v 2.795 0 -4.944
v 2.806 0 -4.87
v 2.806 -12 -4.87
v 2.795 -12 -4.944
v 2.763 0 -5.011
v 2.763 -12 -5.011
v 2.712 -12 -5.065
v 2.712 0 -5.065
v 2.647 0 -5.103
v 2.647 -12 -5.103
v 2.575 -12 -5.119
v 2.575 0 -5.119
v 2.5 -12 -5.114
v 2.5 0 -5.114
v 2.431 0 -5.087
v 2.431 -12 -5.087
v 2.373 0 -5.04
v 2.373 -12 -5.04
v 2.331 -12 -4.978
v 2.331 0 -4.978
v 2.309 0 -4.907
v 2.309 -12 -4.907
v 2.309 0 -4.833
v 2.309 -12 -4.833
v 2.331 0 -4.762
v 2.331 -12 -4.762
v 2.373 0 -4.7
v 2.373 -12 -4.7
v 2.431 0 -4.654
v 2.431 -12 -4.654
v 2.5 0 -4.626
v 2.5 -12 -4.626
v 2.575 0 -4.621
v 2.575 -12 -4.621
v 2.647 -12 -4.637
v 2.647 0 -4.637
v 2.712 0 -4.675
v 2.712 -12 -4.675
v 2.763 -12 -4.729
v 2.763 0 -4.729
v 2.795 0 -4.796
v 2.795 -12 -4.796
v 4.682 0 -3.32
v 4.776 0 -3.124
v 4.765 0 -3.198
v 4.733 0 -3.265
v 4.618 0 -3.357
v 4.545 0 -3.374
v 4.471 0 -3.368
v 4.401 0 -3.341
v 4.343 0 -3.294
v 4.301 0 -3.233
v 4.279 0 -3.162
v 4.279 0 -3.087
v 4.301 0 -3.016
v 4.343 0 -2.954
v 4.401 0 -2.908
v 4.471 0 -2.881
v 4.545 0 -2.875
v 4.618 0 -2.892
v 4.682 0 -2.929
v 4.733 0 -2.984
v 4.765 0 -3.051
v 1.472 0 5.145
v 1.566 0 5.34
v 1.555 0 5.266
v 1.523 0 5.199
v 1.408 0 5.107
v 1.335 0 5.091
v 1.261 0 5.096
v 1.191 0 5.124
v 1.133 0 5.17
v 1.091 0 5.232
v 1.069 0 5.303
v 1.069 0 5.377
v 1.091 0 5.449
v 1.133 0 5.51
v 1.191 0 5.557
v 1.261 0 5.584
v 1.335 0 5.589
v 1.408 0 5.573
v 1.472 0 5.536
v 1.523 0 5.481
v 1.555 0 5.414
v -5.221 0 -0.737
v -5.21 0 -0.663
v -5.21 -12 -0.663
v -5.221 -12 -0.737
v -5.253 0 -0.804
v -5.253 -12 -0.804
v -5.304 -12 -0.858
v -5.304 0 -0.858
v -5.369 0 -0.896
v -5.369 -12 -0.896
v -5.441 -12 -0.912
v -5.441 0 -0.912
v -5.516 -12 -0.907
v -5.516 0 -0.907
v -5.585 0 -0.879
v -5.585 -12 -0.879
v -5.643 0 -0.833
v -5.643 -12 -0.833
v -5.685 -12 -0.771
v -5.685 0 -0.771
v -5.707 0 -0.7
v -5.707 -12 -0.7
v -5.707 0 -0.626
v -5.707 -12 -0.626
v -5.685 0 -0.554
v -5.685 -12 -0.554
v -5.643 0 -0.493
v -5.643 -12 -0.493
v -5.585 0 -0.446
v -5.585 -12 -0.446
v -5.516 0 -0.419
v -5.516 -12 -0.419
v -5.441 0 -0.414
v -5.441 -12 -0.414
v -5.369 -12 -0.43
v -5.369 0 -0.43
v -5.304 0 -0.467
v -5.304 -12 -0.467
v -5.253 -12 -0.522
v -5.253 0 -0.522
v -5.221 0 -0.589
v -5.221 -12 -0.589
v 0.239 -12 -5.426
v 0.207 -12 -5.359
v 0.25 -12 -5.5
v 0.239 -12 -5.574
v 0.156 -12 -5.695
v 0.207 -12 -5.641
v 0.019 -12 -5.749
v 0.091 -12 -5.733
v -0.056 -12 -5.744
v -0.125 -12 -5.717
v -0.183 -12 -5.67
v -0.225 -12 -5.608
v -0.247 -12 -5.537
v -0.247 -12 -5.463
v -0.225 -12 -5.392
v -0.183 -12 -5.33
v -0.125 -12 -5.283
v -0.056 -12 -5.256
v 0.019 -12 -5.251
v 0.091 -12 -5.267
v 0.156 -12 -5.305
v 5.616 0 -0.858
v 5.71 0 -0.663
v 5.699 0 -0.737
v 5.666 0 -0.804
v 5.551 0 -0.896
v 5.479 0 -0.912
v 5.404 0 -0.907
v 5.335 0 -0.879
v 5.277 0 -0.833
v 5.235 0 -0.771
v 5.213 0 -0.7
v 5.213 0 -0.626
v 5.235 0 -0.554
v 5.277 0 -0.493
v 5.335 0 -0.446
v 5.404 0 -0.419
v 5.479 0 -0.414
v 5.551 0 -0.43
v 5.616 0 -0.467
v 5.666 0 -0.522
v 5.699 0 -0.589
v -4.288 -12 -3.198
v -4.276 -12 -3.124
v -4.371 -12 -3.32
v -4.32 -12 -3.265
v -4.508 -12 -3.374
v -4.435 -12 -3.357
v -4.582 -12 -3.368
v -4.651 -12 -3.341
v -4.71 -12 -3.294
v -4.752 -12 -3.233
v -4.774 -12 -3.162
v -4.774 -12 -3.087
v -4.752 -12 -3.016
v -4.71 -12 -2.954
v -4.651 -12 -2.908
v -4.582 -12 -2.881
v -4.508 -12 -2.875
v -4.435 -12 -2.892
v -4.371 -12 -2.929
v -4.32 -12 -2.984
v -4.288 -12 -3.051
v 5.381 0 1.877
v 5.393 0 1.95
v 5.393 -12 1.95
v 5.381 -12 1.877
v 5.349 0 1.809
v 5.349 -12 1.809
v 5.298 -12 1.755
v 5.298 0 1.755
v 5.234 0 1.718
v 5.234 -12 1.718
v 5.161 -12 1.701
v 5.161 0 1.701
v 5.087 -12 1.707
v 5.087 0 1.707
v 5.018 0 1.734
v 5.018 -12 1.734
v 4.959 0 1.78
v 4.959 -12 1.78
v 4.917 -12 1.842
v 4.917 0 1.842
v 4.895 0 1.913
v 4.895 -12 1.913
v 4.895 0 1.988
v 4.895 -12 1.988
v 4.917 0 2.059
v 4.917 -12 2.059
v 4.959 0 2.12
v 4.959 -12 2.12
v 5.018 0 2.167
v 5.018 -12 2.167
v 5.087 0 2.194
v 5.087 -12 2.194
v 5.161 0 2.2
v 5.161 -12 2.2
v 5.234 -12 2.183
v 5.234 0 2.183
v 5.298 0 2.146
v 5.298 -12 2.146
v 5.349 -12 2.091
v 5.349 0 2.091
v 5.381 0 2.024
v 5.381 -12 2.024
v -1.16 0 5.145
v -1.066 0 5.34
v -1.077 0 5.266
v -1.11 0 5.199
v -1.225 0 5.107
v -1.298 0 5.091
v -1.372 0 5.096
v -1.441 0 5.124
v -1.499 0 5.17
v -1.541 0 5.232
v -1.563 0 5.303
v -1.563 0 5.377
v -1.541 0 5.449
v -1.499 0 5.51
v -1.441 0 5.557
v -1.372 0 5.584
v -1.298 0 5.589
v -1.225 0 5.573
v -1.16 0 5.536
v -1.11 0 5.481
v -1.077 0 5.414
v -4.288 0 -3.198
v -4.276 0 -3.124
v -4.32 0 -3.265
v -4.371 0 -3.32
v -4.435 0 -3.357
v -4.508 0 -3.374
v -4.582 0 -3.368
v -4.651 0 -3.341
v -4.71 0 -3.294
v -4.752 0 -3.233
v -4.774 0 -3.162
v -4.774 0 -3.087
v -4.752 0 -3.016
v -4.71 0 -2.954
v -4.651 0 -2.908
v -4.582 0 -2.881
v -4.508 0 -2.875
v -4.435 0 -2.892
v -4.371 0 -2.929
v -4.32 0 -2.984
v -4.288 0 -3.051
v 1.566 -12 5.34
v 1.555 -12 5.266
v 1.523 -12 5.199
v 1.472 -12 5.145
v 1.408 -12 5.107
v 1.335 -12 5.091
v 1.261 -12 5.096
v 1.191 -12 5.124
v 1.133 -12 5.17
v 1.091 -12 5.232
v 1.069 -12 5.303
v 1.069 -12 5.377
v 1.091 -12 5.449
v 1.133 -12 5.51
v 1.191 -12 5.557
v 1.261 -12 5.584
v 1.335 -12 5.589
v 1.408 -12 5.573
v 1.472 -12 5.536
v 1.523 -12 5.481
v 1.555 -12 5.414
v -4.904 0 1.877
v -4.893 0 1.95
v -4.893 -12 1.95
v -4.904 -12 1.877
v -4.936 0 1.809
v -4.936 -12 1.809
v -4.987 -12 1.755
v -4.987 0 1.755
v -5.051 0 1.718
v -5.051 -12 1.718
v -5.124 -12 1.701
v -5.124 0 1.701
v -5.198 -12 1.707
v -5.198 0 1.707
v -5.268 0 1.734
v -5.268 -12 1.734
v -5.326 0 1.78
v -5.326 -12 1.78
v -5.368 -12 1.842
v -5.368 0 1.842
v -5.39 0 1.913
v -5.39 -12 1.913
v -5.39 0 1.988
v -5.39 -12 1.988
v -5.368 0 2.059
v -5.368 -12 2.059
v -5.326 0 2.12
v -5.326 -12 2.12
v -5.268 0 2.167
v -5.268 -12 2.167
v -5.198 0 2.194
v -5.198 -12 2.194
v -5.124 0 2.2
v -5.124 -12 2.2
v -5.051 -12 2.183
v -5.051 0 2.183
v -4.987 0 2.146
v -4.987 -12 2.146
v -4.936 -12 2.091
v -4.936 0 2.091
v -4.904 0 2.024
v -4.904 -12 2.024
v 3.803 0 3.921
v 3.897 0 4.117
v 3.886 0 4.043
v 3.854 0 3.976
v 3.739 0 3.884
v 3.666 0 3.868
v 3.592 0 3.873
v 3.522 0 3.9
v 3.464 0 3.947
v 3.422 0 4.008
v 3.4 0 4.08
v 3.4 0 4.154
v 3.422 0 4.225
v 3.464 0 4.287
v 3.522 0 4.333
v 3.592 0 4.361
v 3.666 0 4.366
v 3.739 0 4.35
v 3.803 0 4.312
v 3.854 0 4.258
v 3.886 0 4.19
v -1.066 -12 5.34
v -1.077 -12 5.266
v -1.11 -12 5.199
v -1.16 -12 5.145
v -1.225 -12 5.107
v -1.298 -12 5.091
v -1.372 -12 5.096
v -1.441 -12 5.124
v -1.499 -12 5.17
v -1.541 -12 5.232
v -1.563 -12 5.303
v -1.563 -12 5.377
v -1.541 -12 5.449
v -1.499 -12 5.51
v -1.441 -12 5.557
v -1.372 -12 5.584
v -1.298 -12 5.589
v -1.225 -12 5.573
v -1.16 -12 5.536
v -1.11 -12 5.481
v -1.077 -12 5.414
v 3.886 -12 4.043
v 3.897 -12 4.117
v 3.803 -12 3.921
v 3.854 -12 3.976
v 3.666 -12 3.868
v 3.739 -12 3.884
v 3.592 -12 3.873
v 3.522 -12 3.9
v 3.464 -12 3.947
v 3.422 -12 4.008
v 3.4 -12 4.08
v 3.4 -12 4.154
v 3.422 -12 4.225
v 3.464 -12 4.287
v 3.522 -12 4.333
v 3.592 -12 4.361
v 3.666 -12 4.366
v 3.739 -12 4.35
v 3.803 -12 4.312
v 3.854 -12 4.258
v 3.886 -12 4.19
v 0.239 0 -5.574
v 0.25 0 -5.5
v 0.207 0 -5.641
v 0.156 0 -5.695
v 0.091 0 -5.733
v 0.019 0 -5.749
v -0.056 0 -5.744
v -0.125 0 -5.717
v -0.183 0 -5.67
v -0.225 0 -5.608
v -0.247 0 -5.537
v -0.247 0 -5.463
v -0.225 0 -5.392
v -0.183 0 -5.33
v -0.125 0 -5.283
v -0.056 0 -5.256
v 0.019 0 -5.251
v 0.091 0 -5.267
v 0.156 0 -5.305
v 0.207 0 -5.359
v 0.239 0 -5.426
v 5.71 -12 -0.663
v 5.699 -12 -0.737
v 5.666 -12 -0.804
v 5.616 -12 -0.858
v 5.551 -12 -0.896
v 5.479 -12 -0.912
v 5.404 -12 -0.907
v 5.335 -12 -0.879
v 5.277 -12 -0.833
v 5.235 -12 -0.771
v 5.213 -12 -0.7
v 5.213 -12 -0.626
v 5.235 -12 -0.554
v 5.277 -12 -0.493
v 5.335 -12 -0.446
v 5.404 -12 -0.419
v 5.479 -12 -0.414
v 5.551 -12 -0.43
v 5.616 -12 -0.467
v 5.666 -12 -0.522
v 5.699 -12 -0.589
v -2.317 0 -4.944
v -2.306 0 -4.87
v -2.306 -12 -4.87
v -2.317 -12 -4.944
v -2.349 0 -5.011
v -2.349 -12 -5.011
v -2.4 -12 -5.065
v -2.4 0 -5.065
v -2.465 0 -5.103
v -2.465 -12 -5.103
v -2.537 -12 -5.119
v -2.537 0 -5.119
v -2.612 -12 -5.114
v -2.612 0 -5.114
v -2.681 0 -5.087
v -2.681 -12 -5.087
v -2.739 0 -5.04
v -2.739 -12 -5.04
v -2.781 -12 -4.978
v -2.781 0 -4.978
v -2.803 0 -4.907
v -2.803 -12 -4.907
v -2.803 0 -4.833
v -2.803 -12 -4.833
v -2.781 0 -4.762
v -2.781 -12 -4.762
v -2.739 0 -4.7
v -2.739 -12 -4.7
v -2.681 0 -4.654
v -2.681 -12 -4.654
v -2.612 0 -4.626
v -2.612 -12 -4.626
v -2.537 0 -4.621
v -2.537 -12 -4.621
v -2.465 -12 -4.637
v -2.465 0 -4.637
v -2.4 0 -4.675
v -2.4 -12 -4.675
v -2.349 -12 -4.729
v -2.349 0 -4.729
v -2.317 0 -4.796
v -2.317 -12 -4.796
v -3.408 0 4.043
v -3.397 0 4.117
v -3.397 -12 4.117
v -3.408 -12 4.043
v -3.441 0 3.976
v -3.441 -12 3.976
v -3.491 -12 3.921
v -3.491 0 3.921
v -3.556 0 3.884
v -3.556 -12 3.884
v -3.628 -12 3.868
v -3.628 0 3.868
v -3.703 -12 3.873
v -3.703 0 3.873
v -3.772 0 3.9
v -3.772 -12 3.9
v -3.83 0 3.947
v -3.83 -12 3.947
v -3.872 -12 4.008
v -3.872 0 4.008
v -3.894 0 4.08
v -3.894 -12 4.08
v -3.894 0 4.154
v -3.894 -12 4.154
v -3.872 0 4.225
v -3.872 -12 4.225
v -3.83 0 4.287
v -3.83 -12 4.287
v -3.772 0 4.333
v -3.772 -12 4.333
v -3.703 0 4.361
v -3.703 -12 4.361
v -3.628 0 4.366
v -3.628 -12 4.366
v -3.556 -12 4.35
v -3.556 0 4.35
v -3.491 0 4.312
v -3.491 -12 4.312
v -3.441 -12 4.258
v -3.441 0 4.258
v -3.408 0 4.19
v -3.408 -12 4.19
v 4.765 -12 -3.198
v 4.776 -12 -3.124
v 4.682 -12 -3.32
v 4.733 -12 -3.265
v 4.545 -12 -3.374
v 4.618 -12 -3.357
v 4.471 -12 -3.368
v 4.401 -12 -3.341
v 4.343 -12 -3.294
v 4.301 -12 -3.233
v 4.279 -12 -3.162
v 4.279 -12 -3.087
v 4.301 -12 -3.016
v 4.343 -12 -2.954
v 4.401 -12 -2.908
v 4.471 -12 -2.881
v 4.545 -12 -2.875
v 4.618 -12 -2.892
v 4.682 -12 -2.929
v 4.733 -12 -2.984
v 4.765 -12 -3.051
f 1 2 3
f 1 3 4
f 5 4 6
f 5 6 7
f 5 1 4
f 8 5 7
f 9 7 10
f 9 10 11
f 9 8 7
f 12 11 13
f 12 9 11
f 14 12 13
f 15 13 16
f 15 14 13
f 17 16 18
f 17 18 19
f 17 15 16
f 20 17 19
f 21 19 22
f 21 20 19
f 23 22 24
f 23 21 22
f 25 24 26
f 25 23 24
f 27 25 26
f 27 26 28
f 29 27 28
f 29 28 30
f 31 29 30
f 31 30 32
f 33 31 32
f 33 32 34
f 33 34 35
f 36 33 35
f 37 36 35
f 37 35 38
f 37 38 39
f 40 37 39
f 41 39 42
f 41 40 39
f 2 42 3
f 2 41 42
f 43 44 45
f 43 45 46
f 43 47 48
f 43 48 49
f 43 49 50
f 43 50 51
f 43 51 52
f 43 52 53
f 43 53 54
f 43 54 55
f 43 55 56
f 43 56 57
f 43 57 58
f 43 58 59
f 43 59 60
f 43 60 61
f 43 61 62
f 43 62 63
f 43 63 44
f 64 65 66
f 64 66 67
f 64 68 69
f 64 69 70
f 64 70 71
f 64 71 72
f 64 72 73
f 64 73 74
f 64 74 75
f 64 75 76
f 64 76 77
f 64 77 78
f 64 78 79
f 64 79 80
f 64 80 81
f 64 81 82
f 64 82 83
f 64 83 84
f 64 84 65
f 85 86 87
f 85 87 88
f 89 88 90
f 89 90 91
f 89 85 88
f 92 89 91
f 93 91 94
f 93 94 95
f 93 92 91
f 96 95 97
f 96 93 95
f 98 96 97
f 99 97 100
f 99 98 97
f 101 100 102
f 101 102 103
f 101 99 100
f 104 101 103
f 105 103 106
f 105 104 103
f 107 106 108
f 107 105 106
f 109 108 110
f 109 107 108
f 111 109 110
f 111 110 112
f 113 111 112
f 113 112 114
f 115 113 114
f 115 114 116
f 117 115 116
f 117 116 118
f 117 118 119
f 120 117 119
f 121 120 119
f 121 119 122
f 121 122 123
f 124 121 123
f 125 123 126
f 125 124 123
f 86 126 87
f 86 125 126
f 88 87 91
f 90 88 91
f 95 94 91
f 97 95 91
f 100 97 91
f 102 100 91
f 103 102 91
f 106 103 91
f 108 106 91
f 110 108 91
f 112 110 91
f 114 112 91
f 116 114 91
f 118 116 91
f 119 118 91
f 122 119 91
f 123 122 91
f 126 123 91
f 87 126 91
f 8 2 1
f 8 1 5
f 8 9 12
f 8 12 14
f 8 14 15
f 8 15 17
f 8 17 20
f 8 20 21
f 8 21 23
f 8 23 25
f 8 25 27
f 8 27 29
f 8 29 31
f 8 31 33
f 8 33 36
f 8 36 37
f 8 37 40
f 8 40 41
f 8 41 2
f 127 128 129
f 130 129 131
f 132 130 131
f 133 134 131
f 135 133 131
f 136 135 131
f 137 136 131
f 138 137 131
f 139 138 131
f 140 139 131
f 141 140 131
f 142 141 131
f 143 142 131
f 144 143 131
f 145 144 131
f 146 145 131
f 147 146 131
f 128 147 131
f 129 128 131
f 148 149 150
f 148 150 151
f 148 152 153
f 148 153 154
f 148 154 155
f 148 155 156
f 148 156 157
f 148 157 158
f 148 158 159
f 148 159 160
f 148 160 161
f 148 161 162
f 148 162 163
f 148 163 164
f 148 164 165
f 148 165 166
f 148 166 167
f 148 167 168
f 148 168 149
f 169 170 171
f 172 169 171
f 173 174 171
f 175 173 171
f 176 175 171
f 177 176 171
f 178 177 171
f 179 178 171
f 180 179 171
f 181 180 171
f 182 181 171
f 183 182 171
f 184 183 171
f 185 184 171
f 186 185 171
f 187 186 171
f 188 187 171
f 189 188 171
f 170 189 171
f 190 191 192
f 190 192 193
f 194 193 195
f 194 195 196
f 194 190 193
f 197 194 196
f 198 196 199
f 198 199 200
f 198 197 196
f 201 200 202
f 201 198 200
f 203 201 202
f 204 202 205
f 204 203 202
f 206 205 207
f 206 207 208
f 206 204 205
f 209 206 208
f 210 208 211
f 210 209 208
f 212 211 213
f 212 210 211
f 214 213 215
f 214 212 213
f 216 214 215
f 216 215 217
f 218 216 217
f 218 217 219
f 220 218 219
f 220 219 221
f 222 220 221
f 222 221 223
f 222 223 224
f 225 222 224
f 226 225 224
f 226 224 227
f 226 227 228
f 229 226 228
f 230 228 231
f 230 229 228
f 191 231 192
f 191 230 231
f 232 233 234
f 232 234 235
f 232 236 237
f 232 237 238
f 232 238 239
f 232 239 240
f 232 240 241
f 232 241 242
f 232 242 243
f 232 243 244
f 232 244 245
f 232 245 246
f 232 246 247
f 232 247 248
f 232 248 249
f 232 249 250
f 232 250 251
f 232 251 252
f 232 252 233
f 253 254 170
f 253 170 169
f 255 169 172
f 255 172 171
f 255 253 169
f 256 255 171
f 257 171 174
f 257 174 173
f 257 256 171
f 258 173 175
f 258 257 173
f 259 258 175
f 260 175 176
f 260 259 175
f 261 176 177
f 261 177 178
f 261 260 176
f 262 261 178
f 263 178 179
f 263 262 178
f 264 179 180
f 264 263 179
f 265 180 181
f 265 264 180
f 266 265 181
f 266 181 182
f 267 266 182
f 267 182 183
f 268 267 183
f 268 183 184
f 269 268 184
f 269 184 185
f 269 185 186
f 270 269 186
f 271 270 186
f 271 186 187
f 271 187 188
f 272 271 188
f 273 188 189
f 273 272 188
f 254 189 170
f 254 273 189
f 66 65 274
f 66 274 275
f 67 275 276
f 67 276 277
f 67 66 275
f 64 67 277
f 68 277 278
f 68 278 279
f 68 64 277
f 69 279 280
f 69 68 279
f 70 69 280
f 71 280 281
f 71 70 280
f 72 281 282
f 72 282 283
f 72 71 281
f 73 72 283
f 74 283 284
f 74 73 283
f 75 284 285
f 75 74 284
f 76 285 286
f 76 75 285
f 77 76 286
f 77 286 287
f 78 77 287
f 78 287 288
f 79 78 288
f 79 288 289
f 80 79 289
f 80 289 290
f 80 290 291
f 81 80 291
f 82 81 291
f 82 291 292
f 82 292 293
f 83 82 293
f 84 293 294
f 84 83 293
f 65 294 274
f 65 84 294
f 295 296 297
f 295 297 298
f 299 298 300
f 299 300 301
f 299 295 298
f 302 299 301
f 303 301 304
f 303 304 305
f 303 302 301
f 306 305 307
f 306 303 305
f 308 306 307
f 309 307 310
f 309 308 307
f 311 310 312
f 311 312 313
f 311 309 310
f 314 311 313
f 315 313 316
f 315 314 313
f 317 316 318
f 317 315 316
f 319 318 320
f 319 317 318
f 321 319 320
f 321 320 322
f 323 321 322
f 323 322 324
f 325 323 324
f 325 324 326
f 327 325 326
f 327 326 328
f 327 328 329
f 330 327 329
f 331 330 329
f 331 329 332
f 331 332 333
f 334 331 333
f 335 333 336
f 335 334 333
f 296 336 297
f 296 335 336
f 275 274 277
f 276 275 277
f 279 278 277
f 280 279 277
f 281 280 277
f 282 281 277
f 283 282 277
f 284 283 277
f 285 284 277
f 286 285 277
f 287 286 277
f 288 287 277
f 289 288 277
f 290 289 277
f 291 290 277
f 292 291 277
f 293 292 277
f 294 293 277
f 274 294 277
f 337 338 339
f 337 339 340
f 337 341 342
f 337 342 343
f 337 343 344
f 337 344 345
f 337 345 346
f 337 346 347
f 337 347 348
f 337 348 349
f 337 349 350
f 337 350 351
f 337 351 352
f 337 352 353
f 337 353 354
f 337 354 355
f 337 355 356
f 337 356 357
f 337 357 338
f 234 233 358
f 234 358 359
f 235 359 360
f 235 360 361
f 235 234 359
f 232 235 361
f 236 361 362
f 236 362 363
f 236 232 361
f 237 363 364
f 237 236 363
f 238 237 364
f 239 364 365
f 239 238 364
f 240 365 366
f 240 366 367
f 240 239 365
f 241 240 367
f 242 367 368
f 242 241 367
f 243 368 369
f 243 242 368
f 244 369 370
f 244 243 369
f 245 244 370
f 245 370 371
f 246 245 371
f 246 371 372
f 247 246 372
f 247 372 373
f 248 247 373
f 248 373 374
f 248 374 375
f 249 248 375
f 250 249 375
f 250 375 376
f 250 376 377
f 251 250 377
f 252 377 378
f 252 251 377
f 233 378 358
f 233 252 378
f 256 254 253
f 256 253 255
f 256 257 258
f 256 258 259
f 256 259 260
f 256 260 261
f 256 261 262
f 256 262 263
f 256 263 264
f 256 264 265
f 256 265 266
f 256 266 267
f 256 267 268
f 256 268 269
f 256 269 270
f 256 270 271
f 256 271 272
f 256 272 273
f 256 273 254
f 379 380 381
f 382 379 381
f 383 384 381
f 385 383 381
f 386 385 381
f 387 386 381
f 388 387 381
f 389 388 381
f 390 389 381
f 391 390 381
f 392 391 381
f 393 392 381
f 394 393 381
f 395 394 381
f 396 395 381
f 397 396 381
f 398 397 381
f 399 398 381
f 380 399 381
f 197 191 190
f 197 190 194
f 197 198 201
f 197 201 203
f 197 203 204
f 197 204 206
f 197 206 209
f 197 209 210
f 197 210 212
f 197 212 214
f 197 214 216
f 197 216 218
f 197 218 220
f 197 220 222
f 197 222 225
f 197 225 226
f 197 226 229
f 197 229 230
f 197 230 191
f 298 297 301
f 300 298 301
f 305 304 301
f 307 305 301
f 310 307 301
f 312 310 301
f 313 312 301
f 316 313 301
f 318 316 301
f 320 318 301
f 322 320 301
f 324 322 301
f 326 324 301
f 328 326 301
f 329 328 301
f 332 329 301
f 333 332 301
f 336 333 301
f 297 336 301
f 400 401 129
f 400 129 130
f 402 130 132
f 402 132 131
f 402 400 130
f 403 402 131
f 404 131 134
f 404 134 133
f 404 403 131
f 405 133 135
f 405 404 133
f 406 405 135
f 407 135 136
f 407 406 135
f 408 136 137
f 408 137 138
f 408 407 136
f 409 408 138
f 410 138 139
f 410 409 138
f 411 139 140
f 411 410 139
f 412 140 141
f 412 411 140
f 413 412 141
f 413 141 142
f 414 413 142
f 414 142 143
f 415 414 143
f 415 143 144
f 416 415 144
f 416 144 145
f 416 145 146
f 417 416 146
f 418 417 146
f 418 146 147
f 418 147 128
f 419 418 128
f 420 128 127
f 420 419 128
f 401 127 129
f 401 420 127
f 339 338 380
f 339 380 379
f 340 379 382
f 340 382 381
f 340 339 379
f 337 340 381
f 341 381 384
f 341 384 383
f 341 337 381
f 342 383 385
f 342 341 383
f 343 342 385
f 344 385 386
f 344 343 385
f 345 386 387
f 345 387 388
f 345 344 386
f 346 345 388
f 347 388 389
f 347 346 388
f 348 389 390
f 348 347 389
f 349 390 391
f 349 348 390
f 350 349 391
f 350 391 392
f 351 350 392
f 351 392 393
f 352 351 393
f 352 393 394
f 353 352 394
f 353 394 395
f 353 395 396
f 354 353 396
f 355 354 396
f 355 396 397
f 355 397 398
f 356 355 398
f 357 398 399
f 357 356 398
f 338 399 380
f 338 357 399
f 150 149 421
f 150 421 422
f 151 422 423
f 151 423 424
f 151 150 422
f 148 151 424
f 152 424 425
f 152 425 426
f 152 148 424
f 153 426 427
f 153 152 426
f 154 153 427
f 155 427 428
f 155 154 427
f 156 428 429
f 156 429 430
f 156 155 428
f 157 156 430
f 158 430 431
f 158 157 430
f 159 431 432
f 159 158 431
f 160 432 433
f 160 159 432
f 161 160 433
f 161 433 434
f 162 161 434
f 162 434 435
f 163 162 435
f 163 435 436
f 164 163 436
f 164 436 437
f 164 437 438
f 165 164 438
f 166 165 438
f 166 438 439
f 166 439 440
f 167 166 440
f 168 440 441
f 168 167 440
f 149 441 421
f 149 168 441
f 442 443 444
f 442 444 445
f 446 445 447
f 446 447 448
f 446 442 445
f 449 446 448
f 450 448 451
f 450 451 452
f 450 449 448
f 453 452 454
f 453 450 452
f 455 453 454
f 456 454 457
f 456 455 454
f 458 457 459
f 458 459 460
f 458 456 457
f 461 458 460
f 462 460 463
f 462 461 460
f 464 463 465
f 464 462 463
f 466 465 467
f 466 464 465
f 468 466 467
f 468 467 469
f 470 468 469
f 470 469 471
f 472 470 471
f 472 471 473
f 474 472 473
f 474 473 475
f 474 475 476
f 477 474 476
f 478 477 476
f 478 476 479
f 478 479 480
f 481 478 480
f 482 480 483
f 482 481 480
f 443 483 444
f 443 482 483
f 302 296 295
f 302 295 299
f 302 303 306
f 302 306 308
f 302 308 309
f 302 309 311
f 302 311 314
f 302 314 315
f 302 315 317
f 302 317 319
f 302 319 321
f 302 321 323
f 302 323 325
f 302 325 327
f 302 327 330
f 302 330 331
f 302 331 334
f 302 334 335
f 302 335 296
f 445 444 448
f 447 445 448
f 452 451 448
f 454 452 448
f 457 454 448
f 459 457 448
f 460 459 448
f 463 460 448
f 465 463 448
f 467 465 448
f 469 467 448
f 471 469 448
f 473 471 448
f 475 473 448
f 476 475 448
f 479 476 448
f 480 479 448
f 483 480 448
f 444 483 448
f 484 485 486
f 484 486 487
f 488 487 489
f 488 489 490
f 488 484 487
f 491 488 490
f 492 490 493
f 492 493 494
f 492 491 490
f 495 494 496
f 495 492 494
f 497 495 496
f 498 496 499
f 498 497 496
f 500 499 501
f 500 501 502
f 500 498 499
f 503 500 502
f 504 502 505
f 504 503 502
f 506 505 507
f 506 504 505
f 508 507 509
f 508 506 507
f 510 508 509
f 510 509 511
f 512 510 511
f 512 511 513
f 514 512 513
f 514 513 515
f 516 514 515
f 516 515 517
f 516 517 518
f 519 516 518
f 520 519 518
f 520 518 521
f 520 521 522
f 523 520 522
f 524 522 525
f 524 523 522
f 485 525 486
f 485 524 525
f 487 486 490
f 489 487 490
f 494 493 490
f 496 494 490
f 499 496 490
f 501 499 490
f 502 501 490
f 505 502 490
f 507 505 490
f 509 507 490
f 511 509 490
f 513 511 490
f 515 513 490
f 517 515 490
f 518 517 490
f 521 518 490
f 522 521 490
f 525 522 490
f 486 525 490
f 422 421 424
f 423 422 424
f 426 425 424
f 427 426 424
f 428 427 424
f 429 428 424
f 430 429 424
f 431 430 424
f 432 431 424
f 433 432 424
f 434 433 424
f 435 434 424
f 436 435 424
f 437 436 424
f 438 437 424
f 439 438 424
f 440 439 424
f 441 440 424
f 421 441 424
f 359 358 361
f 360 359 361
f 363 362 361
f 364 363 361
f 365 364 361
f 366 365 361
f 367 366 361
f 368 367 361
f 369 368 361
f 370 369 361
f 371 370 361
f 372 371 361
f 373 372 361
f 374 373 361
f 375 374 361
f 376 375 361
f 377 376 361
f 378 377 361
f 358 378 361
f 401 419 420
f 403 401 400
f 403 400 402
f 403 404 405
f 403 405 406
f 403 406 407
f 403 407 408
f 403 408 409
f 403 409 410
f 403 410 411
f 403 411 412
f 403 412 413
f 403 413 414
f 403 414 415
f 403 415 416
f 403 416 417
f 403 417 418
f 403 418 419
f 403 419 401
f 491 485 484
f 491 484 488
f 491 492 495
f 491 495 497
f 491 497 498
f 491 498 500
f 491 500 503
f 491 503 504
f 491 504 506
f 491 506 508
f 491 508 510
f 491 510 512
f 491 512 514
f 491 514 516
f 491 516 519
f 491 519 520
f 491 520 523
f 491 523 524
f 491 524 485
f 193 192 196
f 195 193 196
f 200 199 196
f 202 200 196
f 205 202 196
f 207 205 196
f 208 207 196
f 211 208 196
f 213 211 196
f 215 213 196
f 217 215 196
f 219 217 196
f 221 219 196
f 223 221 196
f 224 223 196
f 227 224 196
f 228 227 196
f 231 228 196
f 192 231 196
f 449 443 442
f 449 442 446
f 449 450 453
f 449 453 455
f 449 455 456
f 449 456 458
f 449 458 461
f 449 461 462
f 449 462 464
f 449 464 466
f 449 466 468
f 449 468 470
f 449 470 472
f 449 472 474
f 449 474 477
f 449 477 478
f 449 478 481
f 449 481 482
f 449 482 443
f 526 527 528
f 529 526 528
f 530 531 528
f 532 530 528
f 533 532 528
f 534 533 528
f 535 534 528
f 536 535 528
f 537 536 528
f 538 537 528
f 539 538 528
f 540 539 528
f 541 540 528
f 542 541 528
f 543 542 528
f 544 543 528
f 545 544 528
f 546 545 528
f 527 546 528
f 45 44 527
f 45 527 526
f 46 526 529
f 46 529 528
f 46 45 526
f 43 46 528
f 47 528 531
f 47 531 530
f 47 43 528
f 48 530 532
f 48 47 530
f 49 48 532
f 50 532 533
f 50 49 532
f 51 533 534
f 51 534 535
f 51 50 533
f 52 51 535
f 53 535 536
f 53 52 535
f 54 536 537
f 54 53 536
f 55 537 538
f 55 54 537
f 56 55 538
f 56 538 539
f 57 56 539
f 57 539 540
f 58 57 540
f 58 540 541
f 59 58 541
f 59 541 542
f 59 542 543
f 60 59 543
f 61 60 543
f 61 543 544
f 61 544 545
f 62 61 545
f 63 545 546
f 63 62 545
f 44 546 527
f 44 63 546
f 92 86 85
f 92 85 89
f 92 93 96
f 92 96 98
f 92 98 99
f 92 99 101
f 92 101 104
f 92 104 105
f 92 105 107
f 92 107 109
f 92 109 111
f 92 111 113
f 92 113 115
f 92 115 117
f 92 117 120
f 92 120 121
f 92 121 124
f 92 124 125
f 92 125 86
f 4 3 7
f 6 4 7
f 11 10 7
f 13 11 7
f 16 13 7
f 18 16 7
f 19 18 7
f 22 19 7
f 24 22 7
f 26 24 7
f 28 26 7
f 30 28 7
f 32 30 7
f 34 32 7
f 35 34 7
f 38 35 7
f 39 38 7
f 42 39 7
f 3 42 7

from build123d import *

# Parameters (mm, degrees)
SKETCH1_R       = 0.25
PINOVI_DEPTH    = 12
PINOVI_2_DEPTH  = 12
PINOVI_3_DEPTH  = 12
PINOVI_4_DEPTH  = 12
PINOVI_5_DEPTH  = 12
PINOVI_6_DEPTH  = 12
PINOVI_7_DEPTH  = 12
PINOVI_8_DEPTH  = 12
PINOVI_9_DEPTH  = 12
PINOVI_10_DEPTH = 12
PINOVI_11_DEPTH = 12
PINOVI_12_DEPTH = 12
PINOVI_13_DEPTH = 12


with BuildPart() as part:
    # Sketch1 → pinovi (new body)
    with BuildSketch(Plane(origin=(0, 0, 0), x_dir=(1, 0, 0), z_dir=(0, 1, 0))):
        with Locations((0, 5.5)):
            Circle(SKETCH1_R)
    extrude(amount=-PINOVI_DEPTH)


with BuildPart() as body_2:
    # Sketch1 → pinovi 2 (new body)
    with BuildSketch(Plane(origin=(0, 0, 0), x_dir=(1, 0, 0), z_dir=(0, 1, 0))):
        with Locations((2.555977446, 4.870008141)):
            Circle(SKETCH1_R)
    extrude(amount=-PINOVI_2_DEPTH)


with BuildPart() as body_3:
    # Sketch1 → pinovi 3 (new body)
    with BuildSketch(Plane(origin=(0, 0, 0), x_dir=(1, 0, 0), z_dir=(0, 1, 0))):
        with Locations((4.526411262, 3.124356107)):
            Circle(SKETCH1_R)
    extrude(amount=-PINOVI_3_DEPTH)


with BuildPart() as body_4:
    # Sketch1 → pinovi 4 (new body)
    with BuildSketch(Plane(origin=(0, 0, 0), x_dir=(1, 0, 0), z_dir=(0, 1, 0))):
        with Locations((5.459898808, 0.662951741)):
            Circle(SKETCH1_R)
    extrude(amount=-PINOVI_4_DEPTH)


with BuildPart() as body_5:
    # Sketch1 → pinovi 5 (new body)
    with BuildSketch(Plane(origin=(0, 0, 0), x_dir=(1, 0, 0), z_dir=(0, 1, 0))):
        with Locations((5.142589335, -1.950326879)):
            Circle(SKETCH1_R)
    extrude(amount=-PINOVI_5_DEPTH)


with BuildPart() as body_6:
    # Sketch1 → pinovi 6 (new body)
    with BuildSketch(Plane(origin=(0, 0, 0), x_dir=(1, 0, 0), z_dir=(0, 1, 0))):
        with Locations((3.64717462, -4.116809115)):
            Circle(SKETCH1_R)
    extrude(amount=-PINOVI_6_DEPTH)


with BuildPart() as body_7:
    # Sketch1 → pinovi 7 (new body)
    with BuildSketch(Plane(origin=(0, 0, 0), x_dir=(1, 0, 0), z_dir=(0, 1, 0))):
        with Locations((1.316236154, -5.340179996)):
            Circle(SKETCH1_R)
    extrude(amount=-PINOVI_7_DEPTH)


with BuildPart() as body_8:
    # Sketch1 → pinovi 8 (new body)
    with BuildSketch(Plane(origin=(0, 0, 0), x_dir=(1, 0, 0), z_dir=(0, 1, 0))):
        with Locations((-1.316236154, -5.340179996)):
            Circle(SKETCH1_R)
    extrude(amount=-PINOVI_8_DEPTH)


with BuildPart() as body_9:
    # Sketch1 → pinovi 9 (new body)
    with BuildSketch(Plane(origin=(0, 0, 0), x_dir=(1, 0, 0), z_dir=(0, 1, 0))):
        with Locations((-3.64717462, -4.116809115)):
            Circle(SKETCH1_R)
    extrude(amount=-PINOVI_9_DEPTH)


with BuildPart() as body_10:
    # Sketch1 → pinovi 10 (new body)
    with BuildSketch(Plane(origin=(0, 0, 0), x_dir=(1, 0, 0), z_dir=(0, 1, 0))):
        with Locations((-5.142589335, -1.950326879)):
            Circle(SKETCH1_R)
    extrude(amount=-PINOVI_10_DEPTH)


with BuildPart() as body_11:
    # Sketch1 → pinovi 11 (new body)
    with BuildSketch(Plane(origin=(0, 0, 0), x_dir=(1, 0, 0), z_dir=(0, 1, 0))):
        with Locations((-5.459898808, 0.662951741)):
            Circle(SKETCH1_R)
    extrude(amount=-PINOVI_11_DEPTH)


with BuildPart() as body_12:
    # Sketch1 → pinovi 12 (new body)
    with BuildSketch(Plane(origin=(0, 0, 0), x_dir=(1, 0, 0), z_dir=(0, 1, 0))):
        with Locations((-4.526411262, 3.124356107)):
            Circle(SKETCH1_R)
    extrude(amount=-PINOVI_12_DEPTH)


with BuildPart() as body_13:
    # Sketch1 → pinovi 13 (new body)
    with BuildSketch(Plane(origin=(0, 0, 0), x_dir=(1, 0, 0), z_dir=(0, 1, 0))):
        with Locations((-2.555977446, 4.870008141)):
            Circle(SKETCH1_R)
    extrude(amount=-PINOVI_13_DEPTH)


solid = Compound([part.part, body_2.part, body_3.part, body_4.part, body_5.part, body_6.part, body_7.part, body_8.part, body_9.part, body_10.part, body_11.part, body_12.part, body_13.part])
